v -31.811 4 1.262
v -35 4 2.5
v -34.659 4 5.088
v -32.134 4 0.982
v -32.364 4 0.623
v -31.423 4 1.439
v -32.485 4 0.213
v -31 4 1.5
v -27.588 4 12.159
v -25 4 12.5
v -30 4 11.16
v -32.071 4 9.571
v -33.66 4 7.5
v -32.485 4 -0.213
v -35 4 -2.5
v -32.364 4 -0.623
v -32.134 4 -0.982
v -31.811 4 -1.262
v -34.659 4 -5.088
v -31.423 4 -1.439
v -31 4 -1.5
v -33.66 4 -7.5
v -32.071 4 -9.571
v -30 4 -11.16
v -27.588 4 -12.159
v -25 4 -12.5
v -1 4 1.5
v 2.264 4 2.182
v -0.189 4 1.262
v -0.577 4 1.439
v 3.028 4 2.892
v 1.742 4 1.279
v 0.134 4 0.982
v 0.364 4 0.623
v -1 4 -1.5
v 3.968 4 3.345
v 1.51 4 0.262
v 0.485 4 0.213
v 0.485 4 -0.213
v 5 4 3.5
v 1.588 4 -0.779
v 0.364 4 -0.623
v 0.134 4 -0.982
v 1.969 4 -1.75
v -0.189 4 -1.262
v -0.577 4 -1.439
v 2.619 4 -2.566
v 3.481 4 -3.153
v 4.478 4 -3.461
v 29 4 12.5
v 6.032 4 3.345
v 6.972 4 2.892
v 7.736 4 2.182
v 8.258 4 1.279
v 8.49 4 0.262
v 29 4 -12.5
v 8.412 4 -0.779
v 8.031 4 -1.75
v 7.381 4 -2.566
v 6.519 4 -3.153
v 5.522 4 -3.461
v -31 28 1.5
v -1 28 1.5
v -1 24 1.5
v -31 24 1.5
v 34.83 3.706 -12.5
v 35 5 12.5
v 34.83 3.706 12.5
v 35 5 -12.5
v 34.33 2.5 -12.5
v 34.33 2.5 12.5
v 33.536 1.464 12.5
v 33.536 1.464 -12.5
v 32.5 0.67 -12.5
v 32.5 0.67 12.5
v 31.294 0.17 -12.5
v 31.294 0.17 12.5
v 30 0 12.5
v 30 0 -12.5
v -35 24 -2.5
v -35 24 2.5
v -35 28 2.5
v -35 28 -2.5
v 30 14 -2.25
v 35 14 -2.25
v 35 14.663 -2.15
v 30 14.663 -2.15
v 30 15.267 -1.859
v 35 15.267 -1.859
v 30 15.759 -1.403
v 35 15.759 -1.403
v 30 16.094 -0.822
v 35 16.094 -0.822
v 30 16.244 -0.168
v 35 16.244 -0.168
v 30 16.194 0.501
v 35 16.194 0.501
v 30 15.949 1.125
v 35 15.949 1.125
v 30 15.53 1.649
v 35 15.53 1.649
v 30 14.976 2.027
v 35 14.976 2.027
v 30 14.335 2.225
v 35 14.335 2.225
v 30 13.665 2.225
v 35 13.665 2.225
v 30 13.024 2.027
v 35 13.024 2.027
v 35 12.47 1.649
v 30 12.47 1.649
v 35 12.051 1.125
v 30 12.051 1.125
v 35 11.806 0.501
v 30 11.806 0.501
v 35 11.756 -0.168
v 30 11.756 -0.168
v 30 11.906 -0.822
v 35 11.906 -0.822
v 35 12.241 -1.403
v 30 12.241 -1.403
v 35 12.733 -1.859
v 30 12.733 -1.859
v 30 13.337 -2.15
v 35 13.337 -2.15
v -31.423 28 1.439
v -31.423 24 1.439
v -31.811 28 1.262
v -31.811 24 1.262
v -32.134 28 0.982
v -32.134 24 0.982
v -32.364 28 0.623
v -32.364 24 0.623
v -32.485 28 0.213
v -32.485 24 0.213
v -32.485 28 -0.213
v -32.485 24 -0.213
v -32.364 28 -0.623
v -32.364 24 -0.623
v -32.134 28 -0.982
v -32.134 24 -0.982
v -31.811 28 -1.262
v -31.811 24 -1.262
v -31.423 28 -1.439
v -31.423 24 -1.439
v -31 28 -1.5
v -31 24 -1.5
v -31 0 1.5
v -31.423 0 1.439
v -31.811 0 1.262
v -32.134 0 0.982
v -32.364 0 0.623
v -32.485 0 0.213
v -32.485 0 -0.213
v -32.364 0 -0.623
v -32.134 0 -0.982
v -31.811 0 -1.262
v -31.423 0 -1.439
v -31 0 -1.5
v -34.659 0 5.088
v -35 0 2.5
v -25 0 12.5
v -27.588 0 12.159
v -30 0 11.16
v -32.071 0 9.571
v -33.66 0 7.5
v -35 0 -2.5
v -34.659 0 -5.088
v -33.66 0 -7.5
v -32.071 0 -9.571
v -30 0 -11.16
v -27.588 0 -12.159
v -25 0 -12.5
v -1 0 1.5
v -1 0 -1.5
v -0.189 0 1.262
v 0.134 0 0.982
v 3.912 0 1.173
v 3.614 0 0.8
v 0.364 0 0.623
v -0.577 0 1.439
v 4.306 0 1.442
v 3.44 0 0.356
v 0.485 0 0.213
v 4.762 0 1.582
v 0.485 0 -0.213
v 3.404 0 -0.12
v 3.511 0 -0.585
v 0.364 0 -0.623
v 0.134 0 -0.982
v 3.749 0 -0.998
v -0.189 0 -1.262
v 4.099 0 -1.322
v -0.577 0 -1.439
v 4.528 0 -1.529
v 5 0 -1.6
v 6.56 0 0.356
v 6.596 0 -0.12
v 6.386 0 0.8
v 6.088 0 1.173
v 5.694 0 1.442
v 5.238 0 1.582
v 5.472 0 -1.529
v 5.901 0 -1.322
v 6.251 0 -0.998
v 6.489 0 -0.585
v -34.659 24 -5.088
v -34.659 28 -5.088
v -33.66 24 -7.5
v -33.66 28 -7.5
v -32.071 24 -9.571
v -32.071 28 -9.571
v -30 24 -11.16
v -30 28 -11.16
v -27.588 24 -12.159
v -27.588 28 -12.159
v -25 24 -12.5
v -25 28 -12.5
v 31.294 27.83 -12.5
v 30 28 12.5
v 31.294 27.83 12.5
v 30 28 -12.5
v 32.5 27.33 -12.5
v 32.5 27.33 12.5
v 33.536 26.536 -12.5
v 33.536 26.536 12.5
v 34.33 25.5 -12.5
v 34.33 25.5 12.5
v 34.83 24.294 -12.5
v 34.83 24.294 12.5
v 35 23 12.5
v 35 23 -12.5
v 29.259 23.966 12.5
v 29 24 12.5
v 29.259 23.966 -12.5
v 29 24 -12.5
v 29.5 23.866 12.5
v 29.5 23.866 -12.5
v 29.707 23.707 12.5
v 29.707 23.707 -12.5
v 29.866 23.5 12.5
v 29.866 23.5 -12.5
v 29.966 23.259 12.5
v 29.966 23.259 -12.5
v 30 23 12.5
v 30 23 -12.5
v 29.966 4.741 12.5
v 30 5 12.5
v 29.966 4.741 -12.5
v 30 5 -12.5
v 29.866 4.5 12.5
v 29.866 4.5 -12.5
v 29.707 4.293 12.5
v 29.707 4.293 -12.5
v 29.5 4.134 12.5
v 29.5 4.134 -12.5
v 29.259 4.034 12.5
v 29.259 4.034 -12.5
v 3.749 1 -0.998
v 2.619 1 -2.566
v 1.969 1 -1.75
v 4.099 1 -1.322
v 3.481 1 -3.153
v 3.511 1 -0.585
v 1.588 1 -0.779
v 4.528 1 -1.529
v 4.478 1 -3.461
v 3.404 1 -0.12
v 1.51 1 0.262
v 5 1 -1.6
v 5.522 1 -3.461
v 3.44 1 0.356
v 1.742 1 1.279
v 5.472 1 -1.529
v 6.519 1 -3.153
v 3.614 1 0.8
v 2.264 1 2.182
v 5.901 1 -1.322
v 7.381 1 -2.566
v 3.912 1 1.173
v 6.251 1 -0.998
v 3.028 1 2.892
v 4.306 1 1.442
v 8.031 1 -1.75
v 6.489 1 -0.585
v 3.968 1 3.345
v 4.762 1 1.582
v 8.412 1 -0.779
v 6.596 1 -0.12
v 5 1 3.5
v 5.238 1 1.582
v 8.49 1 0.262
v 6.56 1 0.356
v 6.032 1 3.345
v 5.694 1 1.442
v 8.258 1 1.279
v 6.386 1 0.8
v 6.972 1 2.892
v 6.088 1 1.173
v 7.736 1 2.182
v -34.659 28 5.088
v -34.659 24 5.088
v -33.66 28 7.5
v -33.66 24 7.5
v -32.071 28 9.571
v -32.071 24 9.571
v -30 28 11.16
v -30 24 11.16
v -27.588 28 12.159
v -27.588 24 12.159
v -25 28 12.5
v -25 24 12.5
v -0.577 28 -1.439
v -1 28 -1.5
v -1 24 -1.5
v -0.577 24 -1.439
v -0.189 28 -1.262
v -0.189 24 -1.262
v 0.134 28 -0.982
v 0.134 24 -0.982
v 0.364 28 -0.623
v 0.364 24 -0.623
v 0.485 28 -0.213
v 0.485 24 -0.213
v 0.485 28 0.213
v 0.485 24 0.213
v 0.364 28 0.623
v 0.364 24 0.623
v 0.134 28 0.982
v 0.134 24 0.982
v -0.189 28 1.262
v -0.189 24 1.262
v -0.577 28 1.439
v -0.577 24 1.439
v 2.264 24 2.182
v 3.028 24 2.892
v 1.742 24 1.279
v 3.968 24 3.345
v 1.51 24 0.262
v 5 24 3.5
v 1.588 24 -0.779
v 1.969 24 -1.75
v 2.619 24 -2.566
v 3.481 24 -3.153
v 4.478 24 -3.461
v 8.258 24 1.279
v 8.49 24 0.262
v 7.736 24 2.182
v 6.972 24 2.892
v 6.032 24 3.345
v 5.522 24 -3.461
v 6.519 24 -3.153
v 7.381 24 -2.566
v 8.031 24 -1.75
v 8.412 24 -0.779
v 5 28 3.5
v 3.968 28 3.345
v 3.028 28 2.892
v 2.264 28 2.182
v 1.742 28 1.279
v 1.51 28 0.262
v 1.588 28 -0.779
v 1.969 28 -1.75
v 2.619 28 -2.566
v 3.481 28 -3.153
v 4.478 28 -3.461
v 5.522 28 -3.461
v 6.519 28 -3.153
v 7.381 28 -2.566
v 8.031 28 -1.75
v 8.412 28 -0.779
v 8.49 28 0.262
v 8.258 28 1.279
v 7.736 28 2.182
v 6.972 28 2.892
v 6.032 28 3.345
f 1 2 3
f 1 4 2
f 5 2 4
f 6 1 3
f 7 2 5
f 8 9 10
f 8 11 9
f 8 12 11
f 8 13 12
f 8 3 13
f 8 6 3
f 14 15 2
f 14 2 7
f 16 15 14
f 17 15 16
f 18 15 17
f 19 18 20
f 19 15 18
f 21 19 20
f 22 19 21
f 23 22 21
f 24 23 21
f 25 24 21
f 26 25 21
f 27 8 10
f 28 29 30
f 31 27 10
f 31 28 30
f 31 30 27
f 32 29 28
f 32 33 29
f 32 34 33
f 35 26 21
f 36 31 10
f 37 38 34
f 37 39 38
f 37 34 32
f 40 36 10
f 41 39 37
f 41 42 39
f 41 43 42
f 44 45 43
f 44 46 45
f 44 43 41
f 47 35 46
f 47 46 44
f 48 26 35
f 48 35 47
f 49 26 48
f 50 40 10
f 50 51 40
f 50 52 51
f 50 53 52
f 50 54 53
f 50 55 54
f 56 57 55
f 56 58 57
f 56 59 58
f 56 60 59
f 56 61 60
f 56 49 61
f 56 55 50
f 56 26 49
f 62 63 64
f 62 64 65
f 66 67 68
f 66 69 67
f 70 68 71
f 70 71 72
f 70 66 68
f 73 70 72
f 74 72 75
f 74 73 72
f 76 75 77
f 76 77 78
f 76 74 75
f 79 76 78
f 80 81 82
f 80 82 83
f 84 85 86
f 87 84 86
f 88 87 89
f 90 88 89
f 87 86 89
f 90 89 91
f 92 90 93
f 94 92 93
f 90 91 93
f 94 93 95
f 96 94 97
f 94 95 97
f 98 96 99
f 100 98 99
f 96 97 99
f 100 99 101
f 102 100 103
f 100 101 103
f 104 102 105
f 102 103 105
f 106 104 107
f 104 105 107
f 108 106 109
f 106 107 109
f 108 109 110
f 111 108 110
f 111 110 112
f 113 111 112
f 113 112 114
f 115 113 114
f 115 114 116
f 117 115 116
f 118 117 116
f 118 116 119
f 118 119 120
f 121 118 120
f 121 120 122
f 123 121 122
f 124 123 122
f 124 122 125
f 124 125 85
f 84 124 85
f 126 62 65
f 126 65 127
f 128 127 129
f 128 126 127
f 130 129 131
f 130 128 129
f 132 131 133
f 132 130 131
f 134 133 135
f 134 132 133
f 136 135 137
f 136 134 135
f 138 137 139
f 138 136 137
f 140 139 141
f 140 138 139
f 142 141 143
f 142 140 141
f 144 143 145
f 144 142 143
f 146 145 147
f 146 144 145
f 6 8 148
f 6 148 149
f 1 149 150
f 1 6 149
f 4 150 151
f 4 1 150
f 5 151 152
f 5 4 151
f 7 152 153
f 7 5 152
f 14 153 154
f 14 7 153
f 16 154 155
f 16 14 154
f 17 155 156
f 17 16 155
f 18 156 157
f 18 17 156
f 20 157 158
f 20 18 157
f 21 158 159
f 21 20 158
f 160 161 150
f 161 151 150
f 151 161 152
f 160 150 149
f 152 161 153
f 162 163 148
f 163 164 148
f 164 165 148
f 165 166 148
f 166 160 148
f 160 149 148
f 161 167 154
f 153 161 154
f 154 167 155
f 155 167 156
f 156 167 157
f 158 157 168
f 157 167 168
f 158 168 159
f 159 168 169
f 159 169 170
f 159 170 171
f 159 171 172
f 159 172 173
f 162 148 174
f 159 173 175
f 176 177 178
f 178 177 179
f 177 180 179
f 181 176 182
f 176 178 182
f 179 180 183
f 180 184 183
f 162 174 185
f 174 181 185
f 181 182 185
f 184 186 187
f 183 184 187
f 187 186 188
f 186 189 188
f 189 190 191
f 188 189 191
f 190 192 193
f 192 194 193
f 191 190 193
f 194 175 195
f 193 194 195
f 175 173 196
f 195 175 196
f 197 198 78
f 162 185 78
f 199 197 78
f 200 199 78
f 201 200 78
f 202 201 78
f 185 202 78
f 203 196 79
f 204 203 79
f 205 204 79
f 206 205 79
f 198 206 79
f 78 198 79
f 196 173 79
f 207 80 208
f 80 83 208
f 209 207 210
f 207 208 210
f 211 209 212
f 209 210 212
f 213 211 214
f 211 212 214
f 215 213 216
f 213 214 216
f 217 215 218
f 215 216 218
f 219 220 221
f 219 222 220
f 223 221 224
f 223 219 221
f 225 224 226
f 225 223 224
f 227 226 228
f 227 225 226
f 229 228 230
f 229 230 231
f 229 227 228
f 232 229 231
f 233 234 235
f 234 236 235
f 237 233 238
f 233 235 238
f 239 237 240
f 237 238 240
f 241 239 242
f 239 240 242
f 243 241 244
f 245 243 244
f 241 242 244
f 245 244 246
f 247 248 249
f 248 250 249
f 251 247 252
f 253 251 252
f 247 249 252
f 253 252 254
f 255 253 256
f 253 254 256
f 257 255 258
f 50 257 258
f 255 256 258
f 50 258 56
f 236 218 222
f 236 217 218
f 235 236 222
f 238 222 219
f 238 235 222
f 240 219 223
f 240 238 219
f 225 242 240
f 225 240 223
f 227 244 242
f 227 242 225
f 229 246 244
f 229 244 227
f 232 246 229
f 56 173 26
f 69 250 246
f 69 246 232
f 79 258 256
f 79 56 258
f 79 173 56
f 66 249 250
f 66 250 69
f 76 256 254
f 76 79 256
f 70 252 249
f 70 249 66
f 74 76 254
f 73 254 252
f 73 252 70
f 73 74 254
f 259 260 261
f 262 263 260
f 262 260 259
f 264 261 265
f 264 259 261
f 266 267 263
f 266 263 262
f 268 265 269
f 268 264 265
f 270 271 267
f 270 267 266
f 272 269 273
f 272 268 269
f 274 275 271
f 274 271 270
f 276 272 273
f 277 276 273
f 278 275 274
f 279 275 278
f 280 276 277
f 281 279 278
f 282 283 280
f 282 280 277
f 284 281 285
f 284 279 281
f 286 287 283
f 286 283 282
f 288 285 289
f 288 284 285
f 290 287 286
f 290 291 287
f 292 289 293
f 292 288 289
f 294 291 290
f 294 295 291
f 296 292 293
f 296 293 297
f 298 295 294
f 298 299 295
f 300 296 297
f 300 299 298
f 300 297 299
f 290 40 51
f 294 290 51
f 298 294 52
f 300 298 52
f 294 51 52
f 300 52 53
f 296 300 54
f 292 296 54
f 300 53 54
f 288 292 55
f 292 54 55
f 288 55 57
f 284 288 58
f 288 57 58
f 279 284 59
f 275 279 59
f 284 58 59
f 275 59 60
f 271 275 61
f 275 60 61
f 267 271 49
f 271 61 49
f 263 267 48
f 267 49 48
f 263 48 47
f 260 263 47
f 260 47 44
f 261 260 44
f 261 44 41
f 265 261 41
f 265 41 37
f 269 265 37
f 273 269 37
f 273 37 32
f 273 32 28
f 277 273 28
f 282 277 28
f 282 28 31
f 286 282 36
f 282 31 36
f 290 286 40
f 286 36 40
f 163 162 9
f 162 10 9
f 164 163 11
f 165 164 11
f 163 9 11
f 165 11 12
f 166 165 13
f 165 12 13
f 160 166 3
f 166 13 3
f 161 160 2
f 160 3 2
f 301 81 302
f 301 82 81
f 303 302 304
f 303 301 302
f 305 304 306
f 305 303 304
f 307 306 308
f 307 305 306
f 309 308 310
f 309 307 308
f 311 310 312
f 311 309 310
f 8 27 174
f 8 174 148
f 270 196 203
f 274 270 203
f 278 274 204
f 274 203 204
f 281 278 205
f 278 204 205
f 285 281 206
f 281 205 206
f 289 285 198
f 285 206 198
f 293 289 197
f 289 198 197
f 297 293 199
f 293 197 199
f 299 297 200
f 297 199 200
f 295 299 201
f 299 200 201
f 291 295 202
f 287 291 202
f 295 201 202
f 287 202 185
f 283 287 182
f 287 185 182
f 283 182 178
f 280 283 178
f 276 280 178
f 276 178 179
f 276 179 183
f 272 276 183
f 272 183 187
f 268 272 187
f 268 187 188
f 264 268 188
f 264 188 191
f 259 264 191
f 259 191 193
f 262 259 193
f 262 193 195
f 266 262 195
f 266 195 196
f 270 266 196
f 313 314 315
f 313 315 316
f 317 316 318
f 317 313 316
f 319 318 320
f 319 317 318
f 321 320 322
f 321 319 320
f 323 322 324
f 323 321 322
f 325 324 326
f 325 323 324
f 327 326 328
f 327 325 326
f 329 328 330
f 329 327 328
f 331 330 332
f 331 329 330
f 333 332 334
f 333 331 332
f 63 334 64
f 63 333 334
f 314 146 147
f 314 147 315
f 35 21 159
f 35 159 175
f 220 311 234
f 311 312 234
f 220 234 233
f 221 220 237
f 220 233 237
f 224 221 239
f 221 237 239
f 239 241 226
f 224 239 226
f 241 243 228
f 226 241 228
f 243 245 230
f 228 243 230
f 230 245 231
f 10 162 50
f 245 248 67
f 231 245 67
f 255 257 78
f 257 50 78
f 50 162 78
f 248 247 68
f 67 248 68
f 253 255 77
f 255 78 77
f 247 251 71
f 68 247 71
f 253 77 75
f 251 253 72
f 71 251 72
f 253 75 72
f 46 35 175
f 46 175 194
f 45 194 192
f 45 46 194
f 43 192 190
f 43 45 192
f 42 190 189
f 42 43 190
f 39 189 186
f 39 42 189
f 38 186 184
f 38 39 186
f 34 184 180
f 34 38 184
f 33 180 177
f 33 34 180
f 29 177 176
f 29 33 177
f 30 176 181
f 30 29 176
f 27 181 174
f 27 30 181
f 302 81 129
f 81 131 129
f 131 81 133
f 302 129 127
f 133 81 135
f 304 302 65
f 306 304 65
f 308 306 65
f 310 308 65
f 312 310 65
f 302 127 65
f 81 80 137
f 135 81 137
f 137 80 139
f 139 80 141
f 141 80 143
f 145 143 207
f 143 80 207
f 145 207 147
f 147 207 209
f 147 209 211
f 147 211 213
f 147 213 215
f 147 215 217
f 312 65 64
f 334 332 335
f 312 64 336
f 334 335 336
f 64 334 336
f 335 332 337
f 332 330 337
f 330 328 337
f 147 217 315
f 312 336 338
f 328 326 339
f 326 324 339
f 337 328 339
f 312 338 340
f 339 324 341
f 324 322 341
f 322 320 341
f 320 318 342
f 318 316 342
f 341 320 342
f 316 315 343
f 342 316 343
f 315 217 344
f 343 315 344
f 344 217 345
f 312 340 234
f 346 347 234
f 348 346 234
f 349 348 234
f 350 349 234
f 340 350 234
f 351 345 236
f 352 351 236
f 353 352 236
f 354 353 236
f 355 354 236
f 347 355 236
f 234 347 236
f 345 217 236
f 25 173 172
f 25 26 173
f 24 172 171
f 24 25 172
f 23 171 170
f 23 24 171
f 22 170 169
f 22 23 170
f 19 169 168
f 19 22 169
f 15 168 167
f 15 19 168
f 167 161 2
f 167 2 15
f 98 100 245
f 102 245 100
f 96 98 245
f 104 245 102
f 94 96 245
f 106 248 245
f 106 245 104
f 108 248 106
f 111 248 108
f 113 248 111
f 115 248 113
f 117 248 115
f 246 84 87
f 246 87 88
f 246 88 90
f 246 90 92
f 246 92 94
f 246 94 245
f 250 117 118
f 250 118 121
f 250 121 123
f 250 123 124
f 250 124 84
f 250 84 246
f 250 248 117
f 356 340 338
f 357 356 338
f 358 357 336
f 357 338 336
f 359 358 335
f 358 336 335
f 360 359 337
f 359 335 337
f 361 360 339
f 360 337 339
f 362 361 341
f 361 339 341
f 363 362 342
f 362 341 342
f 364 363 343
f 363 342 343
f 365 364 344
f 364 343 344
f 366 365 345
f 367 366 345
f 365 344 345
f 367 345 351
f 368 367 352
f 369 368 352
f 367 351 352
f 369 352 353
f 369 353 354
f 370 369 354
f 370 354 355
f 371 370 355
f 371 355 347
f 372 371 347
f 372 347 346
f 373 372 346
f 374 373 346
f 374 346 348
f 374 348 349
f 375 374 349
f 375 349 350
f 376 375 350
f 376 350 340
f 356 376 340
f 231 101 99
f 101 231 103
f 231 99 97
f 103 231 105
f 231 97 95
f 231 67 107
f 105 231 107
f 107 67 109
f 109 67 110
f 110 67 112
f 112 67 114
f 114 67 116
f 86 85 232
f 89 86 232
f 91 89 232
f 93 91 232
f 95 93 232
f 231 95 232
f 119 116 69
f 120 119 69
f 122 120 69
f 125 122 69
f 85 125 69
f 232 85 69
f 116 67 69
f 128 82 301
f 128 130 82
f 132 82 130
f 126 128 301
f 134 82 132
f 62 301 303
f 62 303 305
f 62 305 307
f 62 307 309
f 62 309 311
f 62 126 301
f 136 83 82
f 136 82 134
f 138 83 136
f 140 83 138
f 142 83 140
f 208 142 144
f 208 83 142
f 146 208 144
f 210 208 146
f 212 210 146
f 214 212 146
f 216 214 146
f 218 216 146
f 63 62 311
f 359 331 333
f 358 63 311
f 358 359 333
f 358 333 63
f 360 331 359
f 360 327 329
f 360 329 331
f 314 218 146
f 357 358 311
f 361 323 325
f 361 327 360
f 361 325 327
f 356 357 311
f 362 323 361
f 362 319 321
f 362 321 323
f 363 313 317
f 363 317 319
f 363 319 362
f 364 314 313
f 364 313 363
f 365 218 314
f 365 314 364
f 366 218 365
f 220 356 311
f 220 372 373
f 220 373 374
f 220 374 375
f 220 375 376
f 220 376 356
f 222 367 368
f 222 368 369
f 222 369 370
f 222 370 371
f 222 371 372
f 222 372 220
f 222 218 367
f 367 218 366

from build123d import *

# Parameters (mm, degrees)
SKETCH_1_W          = 70
SKETCH_1_H          = 25
EXTRUDE_1_DEPTH     = 4
SKETCH_2_W          = 5
SKETCH_2_H          = 25
EXTRUDE_2_DEPTH     = 20
SKETCH_3_W          = 70
SKETCH_3_H          = 25
EXTRUDE_3_DEPTH     = 4
SKETCH_4_R          = 1.6
CUT_EXTRUDE_1_DEPTH = 4
SKETCH_5_R          = 3.5
CUT_EXTRUDE_2_DEPTH = 3
SKETCH_6_R          = 3.5
CUT_EXTRUDE_3_DEPTH = 45.240818256
CUT_EXTRUDE_4_DEPTH = 47.532246883
FILLET_1_R          = 10
SKETCH_8_R          = 2.25
CUT_EXTRUDE_5_DEPTH = 77.42152838
FILLET_2_R          = 1
FILLET_3_R          = 5


with BuildPart() as part:
    # Эскиз1 → Бобышка-Вытянуть1 (new body)
    with BuildSketch(Plane(origin=(0, 0, 0), x_dir=(1, 0, 0), z_dir=(0, 1, 0))):
        Rectangle(SKETCH_1_W, SKETCH_1_H)
    extrude(amount=EXTRUDE_1_DEPTH)

    # Эскиз2 → Бобышка-Вытянуть2 (add)
    with BuildSketch(Plane(origin=(0, 4, 0), x_dir=(1, 0, 0), z_dir=(0, 1, 0))):
        with Locations((32.5, 0)):
            Rectangle(SKETCH_2_W, SKETCH_2_H)
    extrude(amount=EXTRUDE_2_DEPTH)

    # Эскиз3 → Бобышка-Вытянуть3 (add)
    with BuildSketch(Plane(origin=(0, 24, 0), x_dir=(1, 0, 0), z_dir=(0, 1, 0))):
        Rectangle(SKETCH_3_W, SKETCH_3_H)
    extrude(amount=EXTRUDE_3_DEPTH)

    # Эскиз4 → Вырез-Вытянуть1 (cut)
    with BuildSketch(Plane.XZ):
        with Locations(Location((5, 0, 0), (0, 0, 270))):
            Circle(SKETCH_4_R)
    extrude(amount=-CUT_EXTRUDE_1_DEPTH, mode=Mode.SUBTRACT)

    # Эскиз5 → Вырез-Вытянуть2 (cut)
    with BuildSketch(Plane(origin=(0, 4, 0), x_dir=(1, 0, 0), z_dir=(0, 1, 0))):
        with Locations(Location((5, 0, 0), (0, 0, 270))):
            Circle(SKETCH_5_R)
    extrude(amount=-CUT_EXTRUDE_2_DEPTH, mode=Mode.SUBTRACT)

    # Эскиз6 → Вырез-Вытянуть3 (cut, through all)
    with BuildSketch(Plane.XZ.offset(-24)):
        with Locations(Location((5, 0, 0), (0, 0, 90))):
            Circle(SKETCH_6_R)
    extrude(amount=-CUT_EXTRUDE_3_DEPTH, mode=Mode.SUBTRACT)

    # Эскиз7 → Вырез-Вытянуть4 (cut, through all)
    with BuildSketch(Plane(origin=(0, 28, 0), x_dir=(1, 0, 0), z_dir=(0, 1, 0))):
        with BuildLine():
            Line((-31, 1.5), (-1, 1.5))
            ThreePointArc((-1, 1.5), (0.5, 0), (-1, -1.5))
            Line((-1, -1.5), (-31, -1.5))
            ThreePointArc((-31, -1.5), (-32.5, 0), (-31, 1.5))
        make_face()
    extrude(amount=-CUT_EXTRUDE_4_DEPTH, mode=Mode.SUBTRACT)

    # Скругление1
    fillet_1_edges = [part.edges().sort_by_distance(p)[0] for p in [
        (-35, 26, -12.5),
        (-35, 26, 12.5),
        (-35, 2, 12.5),
        (-35, 2, -12.5),
    ]]
    fillet(fillet_1_edges, radius=FILLET_1_R)

    # Эскиз8 → Вырез-Вытянуть5 (cut, through all)
    with BuildSketch(Plane(origin=(35, 0, 0), x_dir=(0, 0, -1), z_dir=(1, 0, 0))):
        with Locations((0, 14)):
            Circle(SKETCH_8_R)
    extrude(amount=-CUT_EXTRUDE_5_DEPTH, mode=Mode.SUBTRACT)

    # Скругление2
    fillet_2_edges = [part.edges().sort_by_distance(p)[0] for p in [
        (30, 4, 0),
        (30, 24, 0),
    ]]
    fillet(fillet_2_edges, radius=FILLET_2_R)

    # Скругление3
    fillet_3_edges = [part.edges().sort_by_distance(p)[0] for p in [
        (35, 28, 0),
        (35, 0, 0),
    ]]
    fillet(fillet_3_edges, radius=FILLET_3_R)


solid = part.part
